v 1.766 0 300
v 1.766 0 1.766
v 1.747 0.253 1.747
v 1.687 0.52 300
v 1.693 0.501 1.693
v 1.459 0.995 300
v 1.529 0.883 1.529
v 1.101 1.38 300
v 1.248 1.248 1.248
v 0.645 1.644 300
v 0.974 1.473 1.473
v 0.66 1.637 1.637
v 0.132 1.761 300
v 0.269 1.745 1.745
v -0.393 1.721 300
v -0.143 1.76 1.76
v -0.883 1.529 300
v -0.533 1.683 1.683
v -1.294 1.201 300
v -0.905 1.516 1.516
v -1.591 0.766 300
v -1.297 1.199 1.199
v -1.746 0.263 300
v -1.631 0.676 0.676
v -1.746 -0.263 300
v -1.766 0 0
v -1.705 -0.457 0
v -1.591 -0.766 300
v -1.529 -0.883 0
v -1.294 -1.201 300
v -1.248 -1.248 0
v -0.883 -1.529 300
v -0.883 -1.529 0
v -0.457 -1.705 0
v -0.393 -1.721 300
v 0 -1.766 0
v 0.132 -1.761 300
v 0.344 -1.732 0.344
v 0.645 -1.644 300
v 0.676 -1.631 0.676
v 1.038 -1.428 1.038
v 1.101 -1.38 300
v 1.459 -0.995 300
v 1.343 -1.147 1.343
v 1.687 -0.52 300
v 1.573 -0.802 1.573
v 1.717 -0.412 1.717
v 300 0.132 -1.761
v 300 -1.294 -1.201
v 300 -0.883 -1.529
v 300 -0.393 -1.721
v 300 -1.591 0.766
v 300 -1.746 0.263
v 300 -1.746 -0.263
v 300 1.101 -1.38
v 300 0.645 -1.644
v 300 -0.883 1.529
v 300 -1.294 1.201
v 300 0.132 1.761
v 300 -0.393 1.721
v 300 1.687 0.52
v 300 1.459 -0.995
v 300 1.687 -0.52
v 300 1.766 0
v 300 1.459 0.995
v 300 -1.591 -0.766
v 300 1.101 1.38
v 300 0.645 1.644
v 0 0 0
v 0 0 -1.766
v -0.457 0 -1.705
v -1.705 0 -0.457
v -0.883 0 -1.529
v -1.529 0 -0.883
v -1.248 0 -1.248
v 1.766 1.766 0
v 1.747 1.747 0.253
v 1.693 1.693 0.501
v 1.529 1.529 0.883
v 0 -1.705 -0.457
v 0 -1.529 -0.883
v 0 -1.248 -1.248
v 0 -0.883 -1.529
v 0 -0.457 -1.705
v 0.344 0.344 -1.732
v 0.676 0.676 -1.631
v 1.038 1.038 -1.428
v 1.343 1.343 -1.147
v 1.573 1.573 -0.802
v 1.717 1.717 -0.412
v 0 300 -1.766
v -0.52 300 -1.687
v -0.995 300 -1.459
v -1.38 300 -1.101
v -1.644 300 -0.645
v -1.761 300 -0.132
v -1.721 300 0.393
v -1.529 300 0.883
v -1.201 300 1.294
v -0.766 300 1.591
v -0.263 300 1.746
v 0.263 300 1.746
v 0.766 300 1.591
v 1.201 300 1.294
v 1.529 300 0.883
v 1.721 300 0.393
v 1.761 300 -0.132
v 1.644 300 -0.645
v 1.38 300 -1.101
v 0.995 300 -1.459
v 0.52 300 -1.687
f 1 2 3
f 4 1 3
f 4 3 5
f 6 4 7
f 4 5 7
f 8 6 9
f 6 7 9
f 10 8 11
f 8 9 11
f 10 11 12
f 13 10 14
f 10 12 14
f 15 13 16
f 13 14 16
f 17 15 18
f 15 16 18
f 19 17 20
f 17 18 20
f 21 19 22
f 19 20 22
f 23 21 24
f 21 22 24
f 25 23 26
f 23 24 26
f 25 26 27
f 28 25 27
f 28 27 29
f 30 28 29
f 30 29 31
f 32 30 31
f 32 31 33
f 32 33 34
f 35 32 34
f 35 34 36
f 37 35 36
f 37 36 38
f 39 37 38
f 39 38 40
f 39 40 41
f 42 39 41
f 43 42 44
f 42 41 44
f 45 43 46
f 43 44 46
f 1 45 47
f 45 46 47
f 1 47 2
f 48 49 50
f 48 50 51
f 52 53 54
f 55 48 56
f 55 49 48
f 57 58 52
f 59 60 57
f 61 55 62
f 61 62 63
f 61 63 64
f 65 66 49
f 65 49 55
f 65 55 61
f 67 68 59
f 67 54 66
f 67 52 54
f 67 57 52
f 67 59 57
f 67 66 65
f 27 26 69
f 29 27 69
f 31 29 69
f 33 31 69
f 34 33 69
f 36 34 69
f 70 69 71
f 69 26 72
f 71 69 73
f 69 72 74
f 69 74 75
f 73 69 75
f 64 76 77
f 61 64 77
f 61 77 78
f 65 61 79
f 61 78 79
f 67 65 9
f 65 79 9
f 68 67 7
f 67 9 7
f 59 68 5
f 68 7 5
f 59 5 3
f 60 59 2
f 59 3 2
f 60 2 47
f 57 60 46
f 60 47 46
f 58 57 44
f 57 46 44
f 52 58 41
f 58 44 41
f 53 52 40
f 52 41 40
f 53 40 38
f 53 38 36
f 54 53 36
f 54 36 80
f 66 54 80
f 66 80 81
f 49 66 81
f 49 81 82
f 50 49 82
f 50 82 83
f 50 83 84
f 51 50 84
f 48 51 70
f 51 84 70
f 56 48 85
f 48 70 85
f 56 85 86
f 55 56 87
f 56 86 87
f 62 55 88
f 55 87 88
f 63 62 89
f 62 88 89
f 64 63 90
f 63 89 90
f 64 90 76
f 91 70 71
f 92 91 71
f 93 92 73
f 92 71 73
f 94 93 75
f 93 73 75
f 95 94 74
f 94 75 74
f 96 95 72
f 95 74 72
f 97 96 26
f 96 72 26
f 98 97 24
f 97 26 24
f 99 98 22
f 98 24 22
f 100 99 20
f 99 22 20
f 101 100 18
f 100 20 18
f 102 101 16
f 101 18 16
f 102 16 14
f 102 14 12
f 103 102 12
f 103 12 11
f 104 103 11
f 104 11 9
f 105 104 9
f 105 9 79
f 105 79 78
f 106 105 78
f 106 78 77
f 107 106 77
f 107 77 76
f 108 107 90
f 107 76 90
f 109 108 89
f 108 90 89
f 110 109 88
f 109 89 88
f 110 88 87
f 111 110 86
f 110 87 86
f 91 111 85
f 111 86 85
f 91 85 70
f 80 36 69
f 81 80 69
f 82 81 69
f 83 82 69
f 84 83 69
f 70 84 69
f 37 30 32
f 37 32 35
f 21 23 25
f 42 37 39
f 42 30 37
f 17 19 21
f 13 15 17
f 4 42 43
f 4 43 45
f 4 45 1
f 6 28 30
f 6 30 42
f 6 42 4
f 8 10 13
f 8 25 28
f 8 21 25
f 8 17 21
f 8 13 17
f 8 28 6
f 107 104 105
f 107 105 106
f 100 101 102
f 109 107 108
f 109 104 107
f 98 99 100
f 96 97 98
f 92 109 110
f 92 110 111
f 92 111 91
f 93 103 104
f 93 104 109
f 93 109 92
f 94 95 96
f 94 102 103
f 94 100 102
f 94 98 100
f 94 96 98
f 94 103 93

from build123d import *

# Parameters (mm, degrees)
SKETCH1_R           = 1.765617114
BOSS_EXTRUDE1_DEPTH = 300
SKETCH2_R           = 1.765617114
BOSS_EXTRUDE2_DEPTH = 300
SKETCH3_R           = 1.765617114
BOSS_EXTRUDE3_DEPTH = 300


with BuildPart() as part:
    # Sketch1 → Boss-Extrude1 (new body)
    with BuildSketch(Plane.XY):
        Circle(SKETCH1_R)
    extrude(amount=BOSS_EXTRUDE1_DEPTH)

    # Sketch2 → Boss-Extrude2 (add)
    with BuildSketch(Plane(origin=(0, 0, 0), x_dir=(0, 0, -1), z_dir=(1, 0, 0))):
        with Locations(Location((0, 0, 0), (0, 0, 90))):
            Circle(SKETCH2_R)
    extrude(amount=BOSS_EXTRUDE2_DEPTH)

    # Sketch3 → Boss-Extrude3 (add)
    with BuildSketch(Plane(origin=(0, 0, 0), x_dir=(1, 0, 0), z_dir=(0, 1, 0))):
        with Locations(Location((0, 0, 0), (0, 0, 90))):
            Circle(SKETCH3_R)
    extrude(amount=BOSS_EXTRUDE3_DEPTH)


solid = part.part
